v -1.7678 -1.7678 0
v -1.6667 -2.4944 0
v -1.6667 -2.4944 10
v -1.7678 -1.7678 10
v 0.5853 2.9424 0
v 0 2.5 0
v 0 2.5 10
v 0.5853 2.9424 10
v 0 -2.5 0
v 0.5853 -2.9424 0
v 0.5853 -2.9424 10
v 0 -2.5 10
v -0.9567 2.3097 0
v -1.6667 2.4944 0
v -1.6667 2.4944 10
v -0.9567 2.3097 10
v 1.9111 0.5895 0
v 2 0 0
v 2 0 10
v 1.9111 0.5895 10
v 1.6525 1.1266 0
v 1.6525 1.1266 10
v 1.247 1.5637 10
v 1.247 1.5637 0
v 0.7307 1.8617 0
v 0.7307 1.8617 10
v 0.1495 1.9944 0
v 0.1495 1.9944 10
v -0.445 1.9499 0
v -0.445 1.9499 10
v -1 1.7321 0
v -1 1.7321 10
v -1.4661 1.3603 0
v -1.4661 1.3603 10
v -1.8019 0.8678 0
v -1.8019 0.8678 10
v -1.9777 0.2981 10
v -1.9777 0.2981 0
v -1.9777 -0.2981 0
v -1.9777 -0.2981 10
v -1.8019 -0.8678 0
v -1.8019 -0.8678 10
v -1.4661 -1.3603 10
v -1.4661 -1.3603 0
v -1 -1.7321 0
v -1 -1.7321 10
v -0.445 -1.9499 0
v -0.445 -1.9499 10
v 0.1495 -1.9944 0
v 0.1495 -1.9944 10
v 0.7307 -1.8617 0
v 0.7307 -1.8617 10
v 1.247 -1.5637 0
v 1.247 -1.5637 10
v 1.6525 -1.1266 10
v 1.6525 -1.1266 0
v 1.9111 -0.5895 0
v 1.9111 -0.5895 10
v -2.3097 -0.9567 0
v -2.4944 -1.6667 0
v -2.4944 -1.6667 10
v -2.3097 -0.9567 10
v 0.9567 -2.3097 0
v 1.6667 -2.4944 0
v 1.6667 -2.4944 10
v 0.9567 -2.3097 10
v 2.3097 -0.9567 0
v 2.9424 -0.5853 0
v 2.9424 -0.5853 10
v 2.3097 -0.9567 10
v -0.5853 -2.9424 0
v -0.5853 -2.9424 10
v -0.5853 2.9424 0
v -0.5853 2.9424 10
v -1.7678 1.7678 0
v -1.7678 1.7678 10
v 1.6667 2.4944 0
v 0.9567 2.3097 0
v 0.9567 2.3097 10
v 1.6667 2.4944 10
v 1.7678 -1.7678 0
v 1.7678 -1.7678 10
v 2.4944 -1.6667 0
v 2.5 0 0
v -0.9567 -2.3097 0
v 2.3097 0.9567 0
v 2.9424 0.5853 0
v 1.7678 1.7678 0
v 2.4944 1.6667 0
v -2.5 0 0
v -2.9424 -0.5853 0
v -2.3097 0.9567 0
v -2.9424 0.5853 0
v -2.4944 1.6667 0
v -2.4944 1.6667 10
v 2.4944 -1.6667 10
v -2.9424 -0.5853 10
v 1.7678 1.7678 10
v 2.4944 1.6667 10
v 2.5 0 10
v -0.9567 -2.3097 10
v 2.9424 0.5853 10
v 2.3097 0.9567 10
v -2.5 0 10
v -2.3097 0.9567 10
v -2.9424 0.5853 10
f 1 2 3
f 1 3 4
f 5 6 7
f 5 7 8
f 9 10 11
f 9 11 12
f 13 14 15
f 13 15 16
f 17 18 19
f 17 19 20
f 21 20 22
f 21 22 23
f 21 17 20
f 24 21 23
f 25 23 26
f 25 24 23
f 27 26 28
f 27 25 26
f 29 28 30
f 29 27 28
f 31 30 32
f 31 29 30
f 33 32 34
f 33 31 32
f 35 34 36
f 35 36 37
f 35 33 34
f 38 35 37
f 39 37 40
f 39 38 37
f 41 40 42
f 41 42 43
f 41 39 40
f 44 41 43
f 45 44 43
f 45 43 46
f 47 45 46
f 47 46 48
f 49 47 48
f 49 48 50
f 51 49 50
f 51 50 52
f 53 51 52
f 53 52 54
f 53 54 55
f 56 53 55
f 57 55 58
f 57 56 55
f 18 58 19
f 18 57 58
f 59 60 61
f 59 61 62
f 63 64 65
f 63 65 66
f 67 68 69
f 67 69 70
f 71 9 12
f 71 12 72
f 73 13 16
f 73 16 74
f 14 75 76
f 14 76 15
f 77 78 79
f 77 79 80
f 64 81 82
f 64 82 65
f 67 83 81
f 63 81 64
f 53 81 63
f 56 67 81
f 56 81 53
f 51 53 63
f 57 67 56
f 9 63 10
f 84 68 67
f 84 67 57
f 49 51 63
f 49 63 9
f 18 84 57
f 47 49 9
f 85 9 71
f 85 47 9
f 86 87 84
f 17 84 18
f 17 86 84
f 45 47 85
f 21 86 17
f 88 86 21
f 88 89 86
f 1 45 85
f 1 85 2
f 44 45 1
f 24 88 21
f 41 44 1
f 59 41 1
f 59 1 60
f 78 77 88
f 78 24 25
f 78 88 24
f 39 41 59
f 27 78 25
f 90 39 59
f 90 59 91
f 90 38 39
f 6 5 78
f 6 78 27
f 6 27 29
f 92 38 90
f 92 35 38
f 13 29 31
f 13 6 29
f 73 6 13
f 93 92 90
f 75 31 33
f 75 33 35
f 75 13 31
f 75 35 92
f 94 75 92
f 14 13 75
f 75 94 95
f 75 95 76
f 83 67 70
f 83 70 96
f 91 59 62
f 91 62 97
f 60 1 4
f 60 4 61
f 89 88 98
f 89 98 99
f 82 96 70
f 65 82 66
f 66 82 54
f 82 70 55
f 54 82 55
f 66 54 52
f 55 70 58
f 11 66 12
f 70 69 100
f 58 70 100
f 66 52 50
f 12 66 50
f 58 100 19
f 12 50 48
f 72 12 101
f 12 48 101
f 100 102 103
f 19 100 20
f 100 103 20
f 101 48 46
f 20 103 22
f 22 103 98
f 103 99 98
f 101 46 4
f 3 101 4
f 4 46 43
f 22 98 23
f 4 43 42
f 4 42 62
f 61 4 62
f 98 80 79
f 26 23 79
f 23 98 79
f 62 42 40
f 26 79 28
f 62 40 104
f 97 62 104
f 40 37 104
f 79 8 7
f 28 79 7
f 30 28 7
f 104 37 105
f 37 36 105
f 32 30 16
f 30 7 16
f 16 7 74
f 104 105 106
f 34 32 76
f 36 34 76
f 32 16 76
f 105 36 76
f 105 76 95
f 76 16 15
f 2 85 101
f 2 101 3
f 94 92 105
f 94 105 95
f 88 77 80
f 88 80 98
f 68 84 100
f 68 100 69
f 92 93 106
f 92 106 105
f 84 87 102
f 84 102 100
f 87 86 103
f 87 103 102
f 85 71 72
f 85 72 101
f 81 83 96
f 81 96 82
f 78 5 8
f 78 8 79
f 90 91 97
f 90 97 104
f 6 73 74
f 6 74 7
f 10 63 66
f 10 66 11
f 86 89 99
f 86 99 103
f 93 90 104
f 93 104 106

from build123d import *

# Parameters (mm, degrees)
SKETCH2_R           = 2
BOSS_EXTRUDE1_DEPTH = 10


with BuildPart() as part:
    # Sketch2 → Boss-Extrude1 (new body)
    with BuildSketch(Plane.XY):
        Polygon((0, 2.5), (0.585270966, 2.942355841), (0.956708581, 2.309698831), (1.666710699, 2.494408837), (1.767766953, 1.767766953), (2.494408837, 1.666710699), (2.309698831, 0.956708581), (2.942355841, 0.585270966), (2.5, 0), (2.942355841, -0.585270966), (2.309698831, -0.956708581), (2.494408837, -1.666710699), (1.767766953, -1.767766953), (1.666710699, -2.494408837), (0.956708581, -2.309698831), (0.585270966, -2.942355841), (0, -2.5), (-0.585270966, -2.942355841), (-0.956708581, -2.309698831), (-1.666710699, -2.494408837), (-1.767766953, -1.767766953), (-2.494408837, -1.666710699), (-2.309698831, -0.956708581), (-2.942355841, -0.585270966), (-2.5, 0), (-2.942355841, 0.585270966), (-2.309698831, 0.956708581), (-2.494408837, 1.666710699), (-1.767766953, 1.767766953), (-1.666710699, 2.494408837), (-0.956708581, 2.309698831), (-0.585270966, 2.942355841), align=None)
        Circle(SKETCH2_R, mode=Mode.SUBTRACT)
    extrude(amount=BOSS_EXTRUDE1_DEPTH)


solid = part.part
